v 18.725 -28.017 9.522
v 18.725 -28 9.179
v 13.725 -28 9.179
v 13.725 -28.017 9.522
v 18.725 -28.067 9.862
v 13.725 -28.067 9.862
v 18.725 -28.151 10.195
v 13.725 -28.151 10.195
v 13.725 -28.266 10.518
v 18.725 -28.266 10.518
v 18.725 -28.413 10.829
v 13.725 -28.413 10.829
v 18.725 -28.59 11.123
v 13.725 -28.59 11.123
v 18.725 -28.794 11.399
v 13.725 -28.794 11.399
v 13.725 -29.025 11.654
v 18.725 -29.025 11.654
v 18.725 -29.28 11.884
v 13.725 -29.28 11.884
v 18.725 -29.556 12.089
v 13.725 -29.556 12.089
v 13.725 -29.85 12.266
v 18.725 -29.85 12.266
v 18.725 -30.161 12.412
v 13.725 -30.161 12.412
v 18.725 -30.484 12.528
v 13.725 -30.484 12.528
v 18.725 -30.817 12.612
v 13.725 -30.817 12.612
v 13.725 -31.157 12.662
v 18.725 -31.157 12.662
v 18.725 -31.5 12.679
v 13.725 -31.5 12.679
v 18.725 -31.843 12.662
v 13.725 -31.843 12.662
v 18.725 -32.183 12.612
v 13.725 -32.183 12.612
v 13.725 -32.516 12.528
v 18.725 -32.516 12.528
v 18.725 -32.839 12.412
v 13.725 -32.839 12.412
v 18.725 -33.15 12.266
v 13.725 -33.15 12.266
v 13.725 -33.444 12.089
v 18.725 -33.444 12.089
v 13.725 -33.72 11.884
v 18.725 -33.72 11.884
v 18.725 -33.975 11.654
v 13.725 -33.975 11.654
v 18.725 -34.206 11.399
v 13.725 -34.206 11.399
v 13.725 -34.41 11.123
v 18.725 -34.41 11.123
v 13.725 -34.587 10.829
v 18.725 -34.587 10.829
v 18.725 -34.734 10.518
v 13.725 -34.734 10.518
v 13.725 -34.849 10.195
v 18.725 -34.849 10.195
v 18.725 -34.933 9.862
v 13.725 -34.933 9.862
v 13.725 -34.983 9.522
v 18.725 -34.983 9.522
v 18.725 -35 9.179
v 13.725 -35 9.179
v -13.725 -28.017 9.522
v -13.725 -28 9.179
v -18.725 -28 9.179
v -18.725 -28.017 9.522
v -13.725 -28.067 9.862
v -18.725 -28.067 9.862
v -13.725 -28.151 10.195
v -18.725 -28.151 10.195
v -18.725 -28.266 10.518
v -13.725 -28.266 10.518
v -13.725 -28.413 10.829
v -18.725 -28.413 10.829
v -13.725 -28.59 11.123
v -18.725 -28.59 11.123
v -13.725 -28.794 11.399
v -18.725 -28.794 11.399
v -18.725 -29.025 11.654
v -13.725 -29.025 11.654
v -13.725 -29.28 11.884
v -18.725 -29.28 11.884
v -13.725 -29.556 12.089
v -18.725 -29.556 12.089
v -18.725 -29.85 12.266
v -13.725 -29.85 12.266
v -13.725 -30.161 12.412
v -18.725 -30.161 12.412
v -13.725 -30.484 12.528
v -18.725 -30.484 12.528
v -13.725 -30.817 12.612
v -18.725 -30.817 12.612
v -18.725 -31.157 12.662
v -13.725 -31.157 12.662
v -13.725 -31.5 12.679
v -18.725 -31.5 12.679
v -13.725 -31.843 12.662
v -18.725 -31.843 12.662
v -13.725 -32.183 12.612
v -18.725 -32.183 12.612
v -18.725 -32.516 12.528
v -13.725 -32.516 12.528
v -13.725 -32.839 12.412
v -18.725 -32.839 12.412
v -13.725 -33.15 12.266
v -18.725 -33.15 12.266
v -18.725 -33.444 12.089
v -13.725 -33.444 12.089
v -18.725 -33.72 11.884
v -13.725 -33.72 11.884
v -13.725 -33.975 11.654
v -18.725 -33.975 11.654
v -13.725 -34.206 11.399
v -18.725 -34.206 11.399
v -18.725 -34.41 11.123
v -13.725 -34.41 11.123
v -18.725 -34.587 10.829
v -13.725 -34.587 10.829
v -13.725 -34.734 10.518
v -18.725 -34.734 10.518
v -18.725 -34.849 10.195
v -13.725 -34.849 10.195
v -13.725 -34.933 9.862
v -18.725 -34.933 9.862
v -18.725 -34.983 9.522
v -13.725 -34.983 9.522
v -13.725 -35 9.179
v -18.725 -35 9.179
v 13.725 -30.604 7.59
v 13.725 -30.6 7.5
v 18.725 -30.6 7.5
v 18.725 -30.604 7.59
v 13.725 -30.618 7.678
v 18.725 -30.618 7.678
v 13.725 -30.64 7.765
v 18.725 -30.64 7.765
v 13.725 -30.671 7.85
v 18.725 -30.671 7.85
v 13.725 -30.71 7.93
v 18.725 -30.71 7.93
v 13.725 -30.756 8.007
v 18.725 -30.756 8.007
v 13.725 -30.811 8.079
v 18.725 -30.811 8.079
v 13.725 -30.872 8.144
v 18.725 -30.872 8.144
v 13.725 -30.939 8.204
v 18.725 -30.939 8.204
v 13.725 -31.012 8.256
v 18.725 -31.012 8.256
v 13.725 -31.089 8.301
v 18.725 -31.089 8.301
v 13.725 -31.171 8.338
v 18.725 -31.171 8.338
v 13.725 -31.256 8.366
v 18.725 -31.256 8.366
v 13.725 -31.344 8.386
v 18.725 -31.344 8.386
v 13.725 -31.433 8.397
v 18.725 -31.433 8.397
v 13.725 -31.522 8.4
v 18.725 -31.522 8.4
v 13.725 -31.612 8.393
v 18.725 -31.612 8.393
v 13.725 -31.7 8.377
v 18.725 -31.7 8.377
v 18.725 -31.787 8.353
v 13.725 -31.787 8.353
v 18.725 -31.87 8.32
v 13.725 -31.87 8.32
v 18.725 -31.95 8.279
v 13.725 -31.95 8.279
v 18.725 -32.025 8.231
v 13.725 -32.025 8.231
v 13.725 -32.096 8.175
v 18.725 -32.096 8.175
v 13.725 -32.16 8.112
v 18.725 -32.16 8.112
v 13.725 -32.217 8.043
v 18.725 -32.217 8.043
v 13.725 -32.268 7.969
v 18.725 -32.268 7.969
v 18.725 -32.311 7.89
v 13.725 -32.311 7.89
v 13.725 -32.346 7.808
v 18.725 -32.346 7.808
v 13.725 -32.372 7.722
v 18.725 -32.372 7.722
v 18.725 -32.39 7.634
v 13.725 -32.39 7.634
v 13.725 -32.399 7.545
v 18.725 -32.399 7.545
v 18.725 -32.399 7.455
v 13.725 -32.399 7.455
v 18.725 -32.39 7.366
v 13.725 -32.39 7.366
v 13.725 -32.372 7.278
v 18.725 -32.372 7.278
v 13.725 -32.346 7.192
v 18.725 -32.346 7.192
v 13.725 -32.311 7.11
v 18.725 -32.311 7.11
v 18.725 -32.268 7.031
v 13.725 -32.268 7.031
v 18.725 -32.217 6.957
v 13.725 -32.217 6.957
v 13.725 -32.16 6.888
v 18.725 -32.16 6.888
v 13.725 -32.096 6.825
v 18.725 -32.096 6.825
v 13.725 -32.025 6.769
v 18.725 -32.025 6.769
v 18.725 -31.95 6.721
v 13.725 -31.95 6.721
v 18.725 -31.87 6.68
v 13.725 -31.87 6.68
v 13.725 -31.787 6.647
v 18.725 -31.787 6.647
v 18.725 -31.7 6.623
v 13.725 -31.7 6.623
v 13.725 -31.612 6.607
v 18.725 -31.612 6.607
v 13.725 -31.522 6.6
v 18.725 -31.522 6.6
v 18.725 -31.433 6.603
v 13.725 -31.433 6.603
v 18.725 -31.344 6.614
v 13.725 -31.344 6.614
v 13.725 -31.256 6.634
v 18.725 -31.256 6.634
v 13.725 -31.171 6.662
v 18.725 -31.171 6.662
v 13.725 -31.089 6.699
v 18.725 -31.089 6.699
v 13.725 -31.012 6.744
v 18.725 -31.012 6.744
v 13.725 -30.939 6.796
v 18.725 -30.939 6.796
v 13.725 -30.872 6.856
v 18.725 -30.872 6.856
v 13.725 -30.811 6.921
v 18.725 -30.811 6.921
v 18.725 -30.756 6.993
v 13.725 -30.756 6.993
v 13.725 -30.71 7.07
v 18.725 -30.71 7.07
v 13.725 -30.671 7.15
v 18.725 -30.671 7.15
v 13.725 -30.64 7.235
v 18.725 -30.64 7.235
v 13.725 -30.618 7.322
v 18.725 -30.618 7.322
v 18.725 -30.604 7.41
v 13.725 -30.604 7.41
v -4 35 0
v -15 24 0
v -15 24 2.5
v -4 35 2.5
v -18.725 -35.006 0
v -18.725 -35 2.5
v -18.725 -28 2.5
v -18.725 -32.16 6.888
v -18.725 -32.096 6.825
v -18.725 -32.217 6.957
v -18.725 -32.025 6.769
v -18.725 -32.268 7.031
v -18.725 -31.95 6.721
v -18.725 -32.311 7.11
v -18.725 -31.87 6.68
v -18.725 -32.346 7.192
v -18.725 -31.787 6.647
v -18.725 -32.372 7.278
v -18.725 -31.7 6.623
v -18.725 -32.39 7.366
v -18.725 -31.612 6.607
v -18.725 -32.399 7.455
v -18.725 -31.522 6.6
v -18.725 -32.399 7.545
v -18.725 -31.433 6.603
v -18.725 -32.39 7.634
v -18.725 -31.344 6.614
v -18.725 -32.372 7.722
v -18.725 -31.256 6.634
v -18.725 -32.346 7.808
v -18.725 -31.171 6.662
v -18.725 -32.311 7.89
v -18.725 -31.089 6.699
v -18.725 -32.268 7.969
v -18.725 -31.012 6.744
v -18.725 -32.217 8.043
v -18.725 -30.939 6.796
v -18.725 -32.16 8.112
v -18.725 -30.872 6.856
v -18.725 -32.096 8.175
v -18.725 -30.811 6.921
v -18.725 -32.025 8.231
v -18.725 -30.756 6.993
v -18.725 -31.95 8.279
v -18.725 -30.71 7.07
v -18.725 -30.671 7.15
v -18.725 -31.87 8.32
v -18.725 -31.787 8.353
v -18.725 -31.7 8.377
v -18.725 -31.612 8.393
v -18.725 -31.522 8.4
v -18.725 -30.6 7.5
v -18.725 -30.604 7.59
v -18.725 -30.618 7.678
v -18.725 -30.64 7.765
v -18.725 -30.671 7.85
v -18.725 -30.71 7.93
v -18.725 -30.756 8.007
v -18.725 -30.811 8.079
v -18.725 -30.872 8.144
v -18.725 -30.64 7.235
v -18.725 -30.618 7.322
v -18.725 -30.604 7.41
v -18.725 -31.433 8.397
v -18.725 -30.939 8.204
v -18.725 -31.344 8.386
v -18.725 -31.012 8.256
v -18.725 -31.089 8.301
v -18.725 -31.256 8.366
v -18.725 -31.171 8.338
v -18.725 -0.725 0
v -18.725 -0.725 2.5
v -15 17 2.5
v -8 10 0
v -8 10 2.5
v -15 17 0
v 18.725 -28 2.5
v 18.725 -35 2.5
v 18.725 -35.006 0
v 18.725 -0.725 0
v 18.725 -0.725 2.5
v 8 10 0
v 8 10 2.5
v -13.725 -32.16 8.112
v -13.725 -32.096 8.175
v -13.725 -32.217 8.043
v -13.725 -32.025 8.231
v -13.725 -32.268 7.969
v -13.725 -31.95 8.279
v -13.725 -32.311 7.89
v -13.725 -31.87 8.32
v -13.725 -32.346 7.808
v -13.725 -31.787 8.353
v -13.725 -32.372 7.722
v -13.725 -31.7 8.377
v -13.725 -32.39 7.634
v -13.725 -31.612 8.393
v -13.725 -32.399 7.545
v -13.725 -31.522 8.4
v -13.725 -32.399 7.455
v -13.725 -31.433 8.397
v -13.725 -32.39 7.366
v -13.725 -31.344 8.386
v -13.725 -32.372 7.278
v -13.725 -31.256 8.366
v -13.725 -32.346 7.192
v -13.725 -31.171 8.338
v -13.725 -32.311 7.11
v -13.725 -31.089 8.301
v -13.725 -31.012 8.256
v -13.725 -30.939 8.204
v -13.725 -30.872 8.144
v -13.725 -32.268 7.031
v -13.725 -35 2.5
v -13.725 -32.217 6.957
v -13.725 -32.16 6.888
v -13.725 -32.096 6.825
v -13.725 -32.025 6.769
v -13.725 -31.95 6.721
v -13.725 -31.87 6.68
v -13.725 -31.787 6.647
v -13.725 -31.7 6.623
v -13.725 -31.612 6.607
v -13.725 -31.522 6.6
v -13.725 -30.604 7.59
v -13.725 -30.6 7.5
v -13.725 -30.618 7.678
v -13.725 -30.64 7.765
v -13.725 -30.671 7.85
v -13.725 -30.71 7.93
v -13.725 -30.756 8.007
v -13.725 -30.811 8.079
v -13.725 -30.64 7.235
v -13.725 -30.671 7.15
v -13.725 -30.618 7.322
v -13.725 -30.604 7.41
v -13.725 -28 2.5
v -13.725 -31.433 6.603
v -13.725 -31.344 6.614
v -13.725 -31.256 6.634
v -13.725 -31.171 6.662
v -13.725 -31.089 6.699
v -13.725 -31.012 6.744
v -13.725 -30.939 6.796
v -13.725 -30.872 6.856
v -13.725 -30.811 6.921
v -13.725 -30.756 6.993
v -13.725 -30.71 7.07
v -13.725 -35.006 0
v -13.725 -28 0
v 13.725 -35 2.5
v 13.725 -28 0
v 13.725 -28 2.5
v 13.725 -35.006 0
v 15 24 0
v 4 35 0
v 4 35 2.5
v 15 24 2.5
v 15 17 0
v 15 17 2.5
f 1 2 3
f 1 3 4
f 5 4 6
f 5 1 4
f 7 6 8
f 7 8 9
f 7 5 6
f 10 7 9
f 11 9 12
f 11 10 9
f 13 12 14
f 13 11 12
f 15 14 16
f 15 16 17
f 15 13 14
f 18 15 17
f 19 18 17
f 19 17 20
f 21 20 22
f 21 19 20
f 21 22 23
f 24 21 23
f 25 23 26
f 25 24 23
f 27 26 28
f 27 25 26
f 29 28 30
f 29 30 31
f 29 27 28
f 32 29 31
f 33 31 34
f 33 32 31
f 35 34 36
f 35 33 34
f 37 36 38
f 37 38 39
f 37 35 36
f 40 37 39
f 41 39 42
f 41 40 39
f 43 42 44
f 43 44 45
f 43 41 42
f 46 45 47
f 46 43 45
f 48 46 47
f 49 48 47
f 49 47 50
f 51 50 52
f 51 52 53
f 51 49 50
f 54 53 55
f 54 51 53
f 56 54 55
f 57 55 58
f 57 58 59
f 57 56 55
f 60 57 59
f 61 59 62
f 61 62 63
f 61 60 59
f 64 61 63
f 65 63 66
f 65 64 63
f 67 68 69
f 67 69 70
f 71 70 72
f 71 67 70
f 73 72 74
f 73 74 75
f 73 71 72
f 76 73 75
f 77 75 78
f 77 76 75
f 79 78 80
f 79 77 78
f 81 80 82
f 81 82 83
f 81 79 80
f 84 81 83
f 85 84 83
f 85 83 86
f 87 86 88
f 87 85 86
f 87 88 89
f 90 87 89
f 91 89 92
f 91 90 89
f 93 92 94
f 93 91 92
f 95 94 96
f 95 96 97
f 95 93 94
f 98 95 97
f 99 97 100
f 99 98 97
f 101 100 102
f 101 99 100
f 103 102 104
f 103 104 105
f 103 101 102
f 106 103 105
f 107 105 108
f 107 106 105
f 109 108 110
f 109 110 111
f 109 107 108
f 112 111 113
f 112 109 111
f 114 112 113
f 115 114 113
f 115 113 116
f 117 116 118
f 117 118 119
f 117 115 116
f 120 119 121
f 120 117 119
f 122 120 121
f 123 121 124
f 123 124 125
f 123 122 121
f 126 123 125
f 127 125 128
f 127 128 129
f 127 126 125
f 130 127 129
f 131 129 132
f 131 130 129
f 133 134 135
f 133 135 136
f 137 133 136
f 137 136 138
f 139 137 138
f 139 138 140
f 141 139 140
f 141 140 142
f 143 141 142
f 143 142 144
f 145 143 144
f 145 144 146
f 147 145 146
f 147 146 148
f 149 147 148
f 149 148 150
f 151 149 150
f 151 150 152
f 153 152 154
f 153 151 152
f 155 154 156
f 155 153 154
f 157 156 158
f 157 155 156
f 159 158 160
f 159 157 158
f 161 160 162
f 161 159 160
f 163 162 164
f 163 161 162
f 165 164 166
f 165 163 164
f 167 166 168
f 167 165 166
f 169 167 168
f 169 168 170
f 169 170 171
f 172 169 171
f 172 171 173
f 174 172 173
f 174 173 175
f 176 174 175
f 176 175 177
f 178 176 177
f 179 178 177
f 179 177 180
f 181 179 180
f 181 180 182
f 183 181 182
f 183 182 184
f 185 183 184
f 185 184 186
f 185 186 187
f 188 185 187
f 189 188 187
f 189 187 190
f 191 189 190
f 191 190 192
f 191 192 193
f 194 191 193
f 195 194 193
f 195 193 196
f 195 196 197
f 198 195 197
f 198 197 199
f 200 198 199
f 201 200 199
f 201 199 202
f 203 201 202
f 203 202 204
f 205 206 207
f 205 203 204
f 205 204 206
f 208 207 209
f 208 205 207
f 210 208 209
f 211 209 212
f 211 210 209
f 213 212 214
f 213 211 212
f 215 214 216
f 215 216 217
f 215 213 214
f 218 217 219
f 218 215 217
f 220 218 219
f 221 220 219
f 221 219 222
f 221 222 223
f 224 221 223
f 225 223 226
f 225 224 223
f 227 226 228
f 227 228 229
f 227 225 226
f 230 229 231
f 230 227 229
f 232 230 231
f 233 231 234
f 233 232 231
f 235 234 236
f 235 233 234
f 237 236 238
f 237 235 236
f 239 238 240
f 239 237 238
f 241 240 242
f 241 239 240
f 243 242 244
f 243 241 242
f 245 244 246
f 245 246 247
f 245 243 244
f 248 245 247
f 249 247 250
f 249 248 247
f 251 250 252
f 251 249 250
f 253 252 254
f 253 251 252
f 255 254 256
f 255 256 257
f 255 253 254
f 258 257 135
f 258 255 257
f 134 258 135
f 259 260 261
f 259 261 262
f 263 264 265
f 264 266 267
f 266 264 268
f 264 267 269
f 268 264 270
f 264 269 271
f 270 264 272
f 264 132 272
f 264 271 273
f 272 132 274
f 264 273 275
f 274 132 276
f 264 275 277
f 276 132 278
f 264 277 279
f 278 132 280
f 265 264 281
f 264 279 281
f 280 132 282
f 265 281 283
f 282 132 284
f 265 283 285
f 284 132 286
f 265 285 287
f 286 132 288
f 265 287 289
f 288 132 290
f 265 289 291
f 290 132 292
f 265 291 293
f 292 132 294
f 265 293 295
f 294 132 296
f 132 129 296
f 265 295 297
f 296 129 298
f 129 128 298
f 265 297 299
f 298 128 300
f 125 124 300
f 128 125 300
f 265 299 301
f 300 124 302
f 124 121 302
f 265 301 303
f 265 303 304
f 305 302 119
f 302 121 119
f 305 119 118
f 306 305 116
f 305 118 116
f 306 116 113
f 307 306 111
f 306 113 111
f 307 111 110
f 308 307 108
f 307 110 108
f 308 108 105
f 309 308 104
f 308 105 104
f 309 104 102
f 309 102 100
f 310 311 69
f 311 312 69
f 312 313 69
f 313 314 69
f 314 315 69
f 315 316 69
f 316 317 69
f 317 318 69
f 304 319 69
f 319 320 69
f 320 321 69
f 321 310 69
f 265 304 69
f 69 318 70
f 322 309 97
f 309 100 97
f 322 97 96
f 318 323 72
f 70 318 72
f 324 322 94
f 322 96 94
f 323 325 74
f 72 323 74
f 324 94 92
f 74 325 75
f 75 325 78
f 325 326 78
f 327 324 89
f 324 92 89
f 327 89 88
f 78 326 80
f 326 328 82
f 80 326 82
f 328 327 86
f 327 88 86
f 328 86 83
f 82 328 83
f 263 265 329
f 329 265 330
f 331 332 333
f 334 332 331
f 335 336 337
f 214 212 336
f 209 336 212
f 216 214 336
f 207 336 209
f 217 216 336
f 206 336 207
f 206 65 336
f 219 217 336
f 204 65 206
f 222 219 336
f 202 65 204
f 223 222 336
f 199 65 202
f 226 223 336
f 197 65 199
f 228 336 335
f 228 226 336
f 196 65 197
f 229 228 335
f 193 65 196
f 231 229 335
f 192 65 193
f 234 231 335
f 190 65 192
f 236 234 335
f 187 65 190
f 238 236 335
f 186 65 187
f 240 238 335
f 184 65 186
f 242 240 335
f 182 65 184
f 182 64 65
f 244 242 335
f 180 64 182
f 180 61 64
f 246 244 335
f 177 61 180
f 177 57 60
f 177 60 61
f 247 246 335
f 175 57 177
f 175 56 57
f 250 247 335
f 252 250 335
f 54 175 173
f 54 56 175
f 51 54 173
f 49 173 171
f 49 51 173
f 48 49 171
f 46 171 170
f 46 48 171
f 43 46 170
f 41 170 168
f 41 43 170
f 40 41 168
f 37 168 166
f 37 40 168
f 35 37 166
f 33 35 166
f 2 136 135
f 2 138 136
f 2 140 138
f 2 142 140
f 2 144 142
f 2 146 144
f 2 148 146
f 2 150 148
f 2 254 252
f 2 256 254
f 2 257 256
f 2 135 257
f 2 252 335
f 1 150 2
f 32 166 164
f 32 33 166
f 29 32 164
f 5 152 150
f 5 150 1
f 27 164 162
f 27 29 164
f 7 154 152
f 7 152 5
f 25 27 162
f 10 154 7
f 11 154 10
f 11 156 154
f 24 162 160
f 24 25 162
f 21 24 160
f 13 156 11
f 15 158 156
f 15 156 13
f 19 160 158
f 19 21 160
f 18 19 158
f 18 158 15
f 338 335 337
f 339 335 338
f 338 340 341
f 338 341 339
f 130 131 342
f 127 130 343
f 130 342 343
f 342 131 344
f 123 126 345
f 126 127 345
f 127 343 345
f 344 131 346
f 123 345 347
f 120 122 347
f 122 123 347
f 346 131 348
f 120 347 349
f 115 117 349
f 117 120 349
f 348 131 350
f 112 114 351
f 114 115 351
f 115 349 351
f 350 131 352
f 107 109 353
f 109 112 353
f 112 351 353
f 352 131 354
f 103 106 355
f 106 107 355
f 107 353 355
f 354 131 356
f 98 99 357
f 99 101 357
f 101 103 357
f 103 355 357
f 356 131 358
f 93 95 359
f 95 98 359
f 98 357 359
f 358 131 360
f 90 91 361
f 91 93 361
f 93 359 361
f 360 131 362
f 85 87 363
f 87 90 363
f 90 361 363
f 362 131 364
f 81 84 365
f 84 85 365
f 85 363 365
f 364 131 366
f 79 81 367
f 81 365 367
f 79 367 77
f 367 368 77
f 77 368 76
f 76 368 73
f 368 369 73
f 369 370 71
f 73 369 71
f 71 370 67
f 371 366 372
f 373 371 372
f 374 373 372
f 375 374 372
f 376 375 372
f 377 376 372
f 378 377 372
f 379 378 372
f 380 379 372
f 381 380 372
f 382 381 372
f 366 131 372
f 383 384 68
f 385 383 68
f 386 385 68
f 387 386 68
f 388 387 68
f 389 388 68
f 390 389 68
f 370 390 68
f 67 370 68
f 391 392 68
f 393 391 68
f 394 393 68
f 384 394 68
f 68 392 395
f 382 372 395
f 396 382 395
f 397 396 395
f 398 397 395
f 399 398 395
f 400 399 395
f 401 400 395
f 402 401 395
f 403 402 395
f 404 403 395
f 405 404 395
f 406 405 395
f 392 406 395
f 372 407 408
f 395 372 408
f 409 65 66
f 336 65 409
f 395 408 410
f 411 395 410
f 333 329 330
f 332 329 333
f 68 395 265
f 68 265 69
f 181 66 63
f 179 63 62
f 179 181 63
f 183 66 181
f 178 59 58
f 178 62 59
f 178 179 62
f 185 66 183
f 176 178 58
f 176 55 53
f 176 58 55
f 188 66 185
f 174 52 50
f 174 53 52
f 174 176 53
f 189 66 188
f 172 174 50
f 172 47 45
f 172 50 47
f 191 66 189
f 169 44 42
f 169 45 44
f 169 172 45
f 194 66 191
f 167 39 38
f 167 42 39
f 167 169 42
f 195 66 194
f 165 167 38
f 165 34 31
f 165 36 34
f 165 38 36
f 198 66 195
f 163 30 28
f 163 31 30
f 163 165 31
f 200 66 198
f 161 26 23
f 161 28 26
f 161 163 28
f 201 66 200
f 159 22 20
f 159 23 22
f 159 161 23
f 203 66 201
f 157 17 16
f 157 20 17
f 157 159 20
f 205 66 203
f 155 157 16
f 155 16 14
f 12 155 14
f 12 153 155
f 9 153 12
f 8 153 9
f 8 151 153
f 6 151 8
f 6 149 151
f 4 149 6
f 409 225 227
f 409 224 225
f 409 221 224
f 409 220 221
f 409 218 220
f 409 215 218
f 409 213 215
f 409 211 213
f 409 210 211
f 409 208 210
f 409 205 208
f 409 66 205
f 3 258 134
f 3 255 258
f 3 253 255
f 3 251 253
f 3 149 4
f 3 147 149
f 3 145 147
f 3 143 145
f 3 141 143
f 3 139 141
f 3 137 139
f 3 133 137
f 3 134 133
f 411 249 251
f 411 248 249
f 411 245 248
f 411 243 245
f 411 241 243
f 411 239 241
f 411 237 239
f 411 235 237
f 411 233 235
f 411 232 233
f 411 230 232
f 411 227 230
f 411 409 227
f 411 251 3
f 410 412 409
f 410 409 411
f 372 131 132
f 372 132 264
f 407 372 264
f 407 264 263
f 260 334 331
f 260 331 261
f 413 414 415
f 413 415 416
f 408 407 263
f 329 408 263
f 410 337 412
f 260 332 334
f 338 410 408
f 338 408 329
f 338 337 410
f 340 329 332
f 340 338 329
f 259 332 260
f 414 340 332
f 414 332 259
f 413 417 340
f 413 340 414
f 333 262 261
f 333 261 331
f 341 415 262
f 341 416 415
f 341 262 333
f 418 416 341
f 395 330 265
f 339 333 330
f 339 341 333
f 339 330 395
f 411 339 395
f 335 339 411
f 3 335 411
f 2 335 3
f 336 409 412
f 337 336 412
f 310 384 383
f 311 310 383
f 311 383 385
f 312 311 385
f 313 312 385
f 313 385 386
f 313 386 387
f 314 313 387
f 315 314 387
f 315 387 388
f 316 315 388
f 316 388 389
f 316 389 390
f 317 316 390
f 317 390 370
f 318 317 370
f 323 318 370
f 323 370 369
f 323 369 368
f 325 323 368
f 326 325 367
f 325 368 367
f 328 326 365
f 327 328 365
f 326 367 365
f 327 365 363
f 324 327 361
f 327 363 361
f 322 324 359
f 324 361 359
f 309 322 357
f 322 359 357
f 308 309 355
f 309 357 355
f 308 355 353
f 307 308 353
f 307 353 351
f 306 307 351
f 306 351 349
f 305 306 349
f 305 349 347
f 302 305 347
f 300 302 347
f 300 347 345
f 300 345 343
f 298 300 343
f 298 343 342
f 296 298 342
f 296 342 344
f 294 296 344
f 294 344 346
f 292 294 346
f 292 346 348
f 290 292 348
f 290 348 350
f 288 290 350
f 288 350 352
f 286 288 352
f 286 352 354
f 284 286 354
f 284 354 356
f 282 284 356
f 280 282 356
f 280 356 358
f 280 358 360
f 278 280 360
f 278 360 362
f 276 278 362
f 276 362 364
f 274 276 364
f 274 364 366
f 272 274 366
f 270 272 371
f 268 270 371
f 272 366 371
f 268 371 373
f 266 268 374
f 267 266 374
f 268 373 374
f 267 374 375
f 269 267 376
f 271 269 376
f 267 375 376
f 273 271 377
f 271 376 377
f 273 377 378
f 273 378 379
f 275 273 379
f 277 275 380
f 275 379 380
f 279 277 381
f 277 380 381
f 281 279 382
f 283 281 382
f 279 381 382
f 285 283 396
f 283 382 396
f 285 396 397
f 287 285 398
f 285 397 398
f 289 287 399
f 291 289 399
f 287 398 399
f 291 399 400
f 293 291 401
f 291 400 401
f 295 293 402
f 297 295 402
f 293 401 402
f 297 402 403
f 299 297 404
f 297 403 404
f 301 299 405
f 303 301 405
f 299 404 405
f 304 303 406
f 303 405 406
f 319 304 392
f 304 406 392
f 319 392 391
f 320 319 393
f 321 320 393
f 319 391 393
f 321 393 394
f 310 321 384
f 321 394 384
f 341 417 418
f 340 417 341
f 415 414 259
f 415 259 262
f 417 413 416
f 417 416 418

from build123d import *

# Parameters (mm, degrees)
F0_R          = 0.9
F1_DEPTH      = 18.725
F1_DEPTH_BACK = 18.725
F2_W          = 27.45
F2_H          = 10
F3_DEPTH      = 25
F3_DEPTH_BACK = 25
F4_DEPTH      = 5
F4_DEPTH_BACK = 5


with BuildPart() as f1:
    # F0 (on Right) → F1 (new body, two sides)
    with BuildSketch(Plane.YZ) as f1_sk:
        with BuildLine():
            Line((-35, 2.5), (-28, 2.5))
            Line((-28, 2.5), (-28, 9.1788107529))
            ThreePointArc((-28, 9.1788107529), (-31.5, 12.6788107529), (-35, 9.1788107529))
            Line((-35, 9.1788107529), (-35, 2.5))
        make_face()
        with Locations((-31.5, 7.5)):
            Circle(F0_R, mode=Mode.SUBTRACT)
        Polygon((35.0000000196, 7.8434e-06), (35.0000000196, 2.5), (-28, 2.5), (-35, 2.5), (-35.0062623424, 7.8434e-06), align=None)
    extrude(amount=F1_DEPTH)
    extrude(f1_sk.sketch, amount=-F1_DEPTH_BACK)

    # F2 (on Top) → F3 (cut, two sides)
    with BuildSketch(Plane.XY) as f3_sk:
        with Locations((0, -33)):
            Rectangle(F2_W, F2_H)
    extrude(amount=F3_DEPTH, mode=Mode.SUBTRACT)
    extrude(f3_sk.sketch, amount=-F3_DEPTH_BACK, mode=Mode.SUBTRACT)

    # F2 (on Top) → F4 (cut, two sides)
    with BuildSketch(Plane.XY) as f4_sk:
        Polygon((15, 17), (15, 10), (25, 10), (25, 31), (15, 31), (15, 24), align=None)
        Polygon((-25, 10), (-15, 10), (-15, 17), (-15, 24), (-15, 31), (-25, 31), align=None)
        Polygon((-15, 17), (-15, 10), (-8, 10), align=None)
        Polygon((-15, 31), (-15, 24), (-8, 31), align=None)
        Polygon((8, 10), (15, 10), (15, 17), align=None)
        Polygon((8, 31), (15, 24), (15, 31), align=None)
        Polygon((15, 31), (25, 31), (25, 38), (1, 38), (8, 31), align=None)
        Polygon((25, 10), (15, 10), (8, 10), (25, -7), align=None)
        Polygon((-8, 10), (-15, 10), (-25, 10), (-25, -7), align=None)
        Polygon((-25, 38), (-25, 31), (-15, 31), (-8, 31), (-1, 38), align=None)
    extrude(amount=-F4_DEPTH, mode=Mode.SUBTRACT)
    extrude(f4_sk.sketch, amount=F4_DEPTH_BACK, mode=Mode.SUBTRACT)


solid = f1.part
